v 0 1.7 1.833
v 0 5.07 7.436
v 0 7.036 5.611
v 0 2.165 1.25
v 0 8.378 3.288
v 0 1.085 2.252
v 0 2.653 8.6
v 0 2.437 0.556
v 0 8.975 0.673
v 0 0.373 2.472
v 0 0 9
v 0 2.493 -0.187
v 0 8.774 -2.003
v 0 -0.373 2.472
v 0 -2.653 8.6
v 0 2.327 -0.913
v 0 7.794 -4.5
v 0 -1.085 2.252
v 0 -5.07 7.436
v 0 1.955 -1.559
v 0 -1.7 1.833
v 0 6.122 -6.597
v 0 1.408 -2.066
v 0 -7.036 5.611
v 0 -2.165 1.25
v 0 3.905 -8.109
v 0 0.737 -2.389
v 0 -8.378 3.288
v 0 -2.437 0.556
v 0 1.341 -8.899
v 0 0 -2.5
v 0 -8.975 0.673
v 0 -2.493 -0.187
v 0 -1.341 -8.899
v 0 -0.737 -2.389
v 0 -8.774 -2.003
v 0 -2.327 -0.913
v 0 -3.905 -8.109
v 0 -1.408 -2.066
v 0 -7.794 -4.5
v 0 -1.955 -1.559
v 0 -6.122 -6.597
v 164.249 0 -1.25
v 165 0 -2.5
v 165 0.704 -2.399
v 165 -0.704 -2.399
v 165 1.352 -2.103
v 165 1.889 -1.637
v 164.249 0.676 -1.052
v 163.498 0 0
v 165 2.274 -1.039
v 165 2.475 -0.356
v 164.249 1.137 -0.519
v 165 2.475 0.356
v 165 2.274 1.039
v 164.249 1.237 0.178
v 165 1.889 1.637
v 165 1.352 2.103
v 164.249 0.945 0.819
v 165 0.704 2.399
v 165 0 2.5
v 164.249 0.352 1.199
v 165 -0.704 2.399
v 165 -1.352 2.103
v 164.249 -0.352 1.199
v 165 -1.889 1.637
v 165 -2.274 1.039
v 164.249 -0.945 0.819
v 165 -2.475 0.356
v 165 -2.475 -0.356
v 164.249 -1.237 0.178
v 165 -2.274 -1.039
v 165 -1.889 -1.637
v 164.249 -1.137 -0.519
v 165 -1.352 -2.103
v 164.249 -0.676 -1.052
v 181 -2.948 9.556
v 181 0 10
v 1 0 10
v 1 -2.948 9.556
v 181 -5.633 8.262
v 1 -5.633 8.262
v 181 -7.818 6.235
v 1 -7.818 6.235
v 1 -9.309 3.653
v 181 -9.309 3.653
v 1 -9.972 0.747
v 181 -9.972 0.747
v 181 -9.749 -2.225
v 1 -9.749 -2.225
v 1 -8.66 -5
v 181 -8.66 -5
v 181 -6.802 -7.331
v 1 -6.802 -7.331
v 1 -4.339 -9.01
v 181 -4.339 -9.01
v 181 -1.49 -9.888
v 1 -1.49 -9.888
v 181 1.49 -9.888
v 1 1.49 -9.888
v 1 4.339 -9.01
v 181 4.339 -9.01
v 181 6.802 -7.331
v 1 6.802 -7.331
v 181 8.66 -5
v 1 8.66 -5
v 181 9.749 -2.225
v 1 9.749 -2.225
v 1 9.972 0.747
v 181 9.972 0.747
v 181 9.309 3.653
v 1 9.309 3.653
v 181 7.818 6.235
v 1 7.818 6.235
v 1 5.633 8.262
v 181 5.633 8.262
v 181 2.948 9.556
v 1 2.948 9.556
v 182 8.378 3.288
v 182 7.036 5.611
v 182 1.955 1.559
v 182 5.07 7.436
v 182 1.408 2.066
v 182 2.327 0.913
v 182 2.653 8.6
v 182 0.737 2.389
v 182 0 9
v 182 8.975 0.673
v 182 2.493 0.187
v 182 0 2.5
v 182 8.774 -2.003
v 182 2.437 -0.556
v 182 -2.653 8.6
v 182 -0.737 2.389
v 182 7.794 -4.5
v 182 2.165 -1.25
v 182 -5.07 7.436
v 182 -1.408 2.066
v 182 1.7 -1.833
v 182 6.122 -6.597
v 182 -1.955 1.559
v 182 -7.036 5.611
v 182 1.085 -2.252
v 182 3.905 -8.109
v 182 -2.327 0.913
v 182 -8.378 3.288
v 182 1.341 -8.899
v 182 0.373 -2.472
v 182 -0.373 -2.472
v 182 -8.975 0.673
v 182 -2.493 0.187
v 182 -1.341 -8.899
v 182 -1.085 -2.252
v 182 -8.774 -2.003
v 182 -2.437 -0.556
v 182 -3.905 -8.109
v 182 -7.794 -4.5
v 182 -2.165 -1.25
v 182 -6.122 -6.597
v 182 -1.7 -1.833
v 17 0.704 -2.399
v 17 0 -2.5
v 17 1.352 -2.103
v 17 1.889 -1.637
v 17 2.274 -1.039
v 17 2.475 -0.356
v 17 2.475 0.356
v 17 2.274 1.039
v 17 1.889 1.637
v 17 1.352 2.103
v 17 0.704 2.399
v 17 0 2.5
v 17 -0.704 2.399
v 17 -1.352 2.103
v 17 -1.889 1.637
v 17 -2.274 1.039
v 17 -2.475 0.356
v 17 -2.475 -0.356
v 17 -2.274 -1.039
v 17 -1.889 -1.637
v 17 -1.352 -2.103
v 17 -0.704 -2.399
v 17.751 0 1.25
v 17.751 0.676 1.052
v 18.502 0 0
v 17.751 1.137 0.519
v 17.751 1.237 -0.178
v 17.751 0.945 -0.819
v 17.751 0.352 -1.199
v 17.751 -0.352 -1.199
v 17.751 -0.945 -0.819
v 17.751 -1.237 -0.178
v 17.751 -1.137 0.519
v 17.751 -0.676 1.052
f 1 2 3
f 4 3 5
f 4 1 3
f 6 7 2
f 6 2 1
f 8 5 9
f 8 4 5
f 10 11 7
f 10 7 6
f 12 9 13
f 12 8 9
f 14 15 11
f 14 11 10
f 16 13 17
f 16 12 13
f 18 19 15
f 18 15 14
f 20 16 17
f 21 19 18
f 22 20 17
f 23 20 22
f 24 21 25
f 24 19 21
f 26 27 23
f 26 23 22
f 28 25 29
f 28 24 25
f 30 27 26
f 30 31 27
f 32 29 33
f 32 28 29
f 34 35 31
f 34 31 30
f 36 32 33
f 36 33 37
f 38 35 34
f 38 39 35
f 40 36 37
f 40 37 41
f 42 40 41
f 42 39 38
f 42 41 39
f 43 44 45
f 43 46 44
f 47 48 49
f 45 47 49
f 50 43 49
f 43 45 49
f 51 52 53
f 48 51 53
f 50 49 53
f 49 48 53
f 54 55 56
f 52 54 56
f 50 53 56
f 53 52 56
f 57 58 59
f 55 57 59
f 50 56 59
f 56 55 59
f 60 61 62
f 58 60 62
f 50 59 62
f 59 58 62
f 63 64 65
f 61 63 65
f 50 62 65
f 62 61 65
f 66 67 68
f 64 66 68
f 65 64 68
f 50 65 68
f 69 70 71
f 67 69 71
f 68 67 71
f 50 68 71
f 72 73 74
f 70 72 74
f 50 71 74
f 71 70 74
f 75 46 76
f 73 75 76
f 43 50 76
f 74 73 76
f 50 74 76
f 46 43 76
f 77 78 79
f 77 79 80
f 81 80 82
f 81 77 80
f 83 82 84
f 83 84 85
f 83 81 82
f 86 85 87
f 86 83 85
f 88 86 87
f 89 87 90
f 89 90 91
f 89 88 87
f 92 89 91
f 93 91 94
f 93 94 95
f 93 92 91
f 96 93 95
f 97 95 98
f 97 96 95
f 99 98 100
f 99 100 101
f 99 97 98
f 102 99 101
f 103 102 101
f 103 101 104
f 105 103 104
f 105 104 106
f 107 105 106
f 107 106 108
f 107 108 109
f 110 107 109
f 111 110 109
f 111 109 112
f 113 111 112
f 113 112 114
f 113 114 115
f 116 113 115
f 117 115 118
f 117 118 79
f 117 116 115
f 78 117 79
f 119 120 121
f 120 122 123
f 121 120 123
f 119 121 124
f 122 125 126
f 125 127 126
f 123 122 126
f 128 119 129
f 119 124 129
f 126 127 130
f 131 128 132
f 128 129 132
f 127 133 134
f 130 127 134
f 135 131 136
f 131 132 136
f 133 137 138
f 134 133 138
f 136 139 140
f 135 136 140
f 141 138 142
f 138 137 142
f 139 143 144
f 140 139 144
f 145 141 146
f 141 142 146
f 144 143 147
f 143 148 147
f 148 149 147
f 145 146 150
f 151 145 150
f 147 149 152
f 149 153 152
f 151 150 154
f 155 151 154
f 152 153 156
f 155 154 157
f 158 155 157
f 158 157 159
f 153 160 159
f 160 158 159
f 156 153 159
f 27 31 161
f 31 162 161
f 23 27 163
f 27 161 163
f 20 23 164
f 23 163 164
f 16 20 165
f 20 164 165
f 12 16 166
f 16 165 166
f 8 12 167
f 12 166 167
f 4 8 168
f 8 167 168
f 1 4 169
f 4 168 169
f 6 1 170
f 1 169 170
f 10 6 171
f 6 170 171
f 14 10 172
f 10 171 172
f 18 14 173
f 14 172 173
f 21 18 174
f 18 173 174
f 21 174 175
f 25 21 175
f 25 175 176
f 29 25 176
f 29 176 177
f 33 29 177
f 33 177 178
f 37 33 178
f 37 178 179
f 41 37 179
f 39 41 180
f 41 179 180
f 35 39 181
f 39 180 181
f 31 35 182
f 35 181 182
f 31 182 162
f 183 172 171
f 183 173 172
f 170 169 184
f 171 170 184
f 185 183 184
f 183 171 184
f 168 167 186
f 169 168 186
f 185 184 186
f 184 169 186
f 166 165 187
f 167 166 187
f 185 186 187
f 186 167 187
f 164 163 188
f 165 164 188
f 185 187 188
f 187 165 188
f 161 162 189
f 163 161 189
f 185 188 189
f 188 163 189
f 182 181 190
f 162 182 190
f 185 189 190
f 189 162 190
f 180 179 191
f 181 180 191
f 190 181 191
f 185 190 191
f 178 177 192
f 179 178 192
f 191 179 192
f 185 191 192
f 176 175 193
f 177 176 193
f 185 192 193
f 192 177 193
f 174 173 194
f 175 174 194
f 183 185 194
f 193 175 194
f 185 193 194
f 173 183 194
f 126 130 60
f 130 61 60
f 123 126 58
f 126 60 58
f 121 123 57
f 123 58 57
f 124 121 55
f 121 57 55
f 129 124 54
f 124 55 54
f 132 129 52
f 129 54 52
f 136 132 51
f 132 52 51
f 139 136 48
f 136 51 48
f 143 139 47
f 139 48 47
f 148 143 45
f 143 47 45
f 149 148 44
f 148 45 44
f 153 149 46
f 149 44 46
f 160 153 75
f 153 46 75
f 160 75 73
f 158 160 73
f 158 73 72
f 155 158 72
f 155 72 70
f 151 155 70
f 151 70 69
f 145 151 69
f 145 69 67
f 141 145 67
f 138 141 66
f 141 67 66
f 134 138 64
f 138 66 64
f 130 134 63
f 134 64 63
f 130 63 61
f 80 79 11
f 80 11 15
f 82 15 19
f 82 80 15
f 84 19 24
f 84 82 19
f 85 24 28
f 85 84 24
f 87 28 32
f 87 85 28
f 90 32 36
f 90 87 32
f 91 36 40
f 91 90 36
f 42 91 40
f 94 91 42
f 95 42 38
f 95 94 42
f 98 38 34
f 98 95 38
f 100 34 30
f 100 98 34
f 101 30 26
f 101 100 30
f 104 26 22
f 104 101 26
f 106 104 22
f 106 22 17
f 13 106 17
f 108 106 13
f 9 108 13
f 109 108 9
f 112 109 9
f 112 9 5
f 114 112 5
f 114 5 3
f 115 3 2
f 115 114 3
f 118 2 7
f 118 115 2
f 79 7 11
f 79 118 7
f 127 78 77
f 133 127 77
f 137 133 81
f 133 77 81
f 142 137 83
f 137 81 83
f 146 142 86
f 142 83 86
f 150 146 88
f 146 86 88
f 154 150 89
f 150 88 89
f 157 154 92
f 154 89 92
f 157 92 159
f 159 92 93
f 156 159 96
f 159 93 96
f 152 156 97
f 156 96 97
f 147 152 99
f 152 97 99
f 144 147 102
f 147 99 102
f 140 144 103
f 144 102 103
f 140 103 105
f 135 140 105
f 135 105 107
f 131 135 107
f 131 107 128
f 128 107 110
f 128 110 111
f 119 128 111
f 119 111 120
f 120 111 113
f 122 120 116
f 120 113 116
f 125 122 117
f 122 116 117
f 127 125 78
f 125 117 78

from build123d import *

# Parameters (mm, degrees)
ESBO_O1_W                 = 182
ESBO_O1_H                 = 10
CHANFRO1_SIZE             = 1
FURO_ROSCADO_DE_M61_D     = 5
FURO_ROSCADO_DE_M61_DEPTH = 17
FURO_ROSCADO_DE_M61_TIP   = 1.502151548
FURO_ROSCADO_DE_M62_D     = 5
FURO_ROSCADO_DE_M62_DEPTH = 17
FURO_ROSCADO_DE_M62_TIP   = 1.502151548


with BuildPart() as part:
    # Esboço1 → Revolução1 (revolve)
    with BuildSketch(Plane.XY, mode=Mode.PRIVATE) as revolu_o1_sk:
        with Locations((91, 5)):
            Rectangle(ESBO_O1_W, ESBO_O1_H)
    revolve(revolu_o1_sk.sketch.rotate(Axis((0, 0, 0), (1, 0, 0)), 90), axis=Axis((0, 0, 0), (1, 0, 0)))

    # Chanfro1
    chanfro1_edges = [part.edges().sort_by_distance(p)[0] for p in [
        (182, 0, -10),
        (0, 0, -10),
    ]]
    chamfer(chanfro1_edges, length=CHANFRO1_SIZE)

    # Furo roscado de M61
    with Locations(Plane(origin=(182, 0, 0), x_dir=(0, 0, -1), z_dir=(1, 0, 0))):
        with Locations((0, 0)):
            Hole(FURO_ROSCADO_DE_M61_D / 2, depth=FURO_ROSCADO_DE_M61_DEPTH)
            with Locations((0, 0, -(FURO_ROSCADO_DE_M61_DEPTH + FURO_ROSCADO_DE_M61_TIP / 2))):  # 118° drill point
                Cone(0, FURO_ROSCADO_DE_M61_D / 2, FURO_ROSCADO_DE_M61_TIP, mode=Mode.SUBTRACT)

    # Furo roscado de M62
    with Locations(Plane.ZY):
        with Locations((0, 0)):
            Hole(FURO_ROSCADO_DE_M62_D / 2, depth=FURO_ROSCADO_DE_M62_DEPTH)
            with Locations((0, 0, -(FURO_ROSCADO_DE_M62_DEPTH + FURO_ROSCADO_DE_M62_TIP / 2))):  # 118° drill point
                Cone(0, FURO_ROSCADO_DE_M62_D / 2, FURO_ROSCADO_DE_M62_TIP, mode=Mode.SUBTRACT)


solid = part.part
